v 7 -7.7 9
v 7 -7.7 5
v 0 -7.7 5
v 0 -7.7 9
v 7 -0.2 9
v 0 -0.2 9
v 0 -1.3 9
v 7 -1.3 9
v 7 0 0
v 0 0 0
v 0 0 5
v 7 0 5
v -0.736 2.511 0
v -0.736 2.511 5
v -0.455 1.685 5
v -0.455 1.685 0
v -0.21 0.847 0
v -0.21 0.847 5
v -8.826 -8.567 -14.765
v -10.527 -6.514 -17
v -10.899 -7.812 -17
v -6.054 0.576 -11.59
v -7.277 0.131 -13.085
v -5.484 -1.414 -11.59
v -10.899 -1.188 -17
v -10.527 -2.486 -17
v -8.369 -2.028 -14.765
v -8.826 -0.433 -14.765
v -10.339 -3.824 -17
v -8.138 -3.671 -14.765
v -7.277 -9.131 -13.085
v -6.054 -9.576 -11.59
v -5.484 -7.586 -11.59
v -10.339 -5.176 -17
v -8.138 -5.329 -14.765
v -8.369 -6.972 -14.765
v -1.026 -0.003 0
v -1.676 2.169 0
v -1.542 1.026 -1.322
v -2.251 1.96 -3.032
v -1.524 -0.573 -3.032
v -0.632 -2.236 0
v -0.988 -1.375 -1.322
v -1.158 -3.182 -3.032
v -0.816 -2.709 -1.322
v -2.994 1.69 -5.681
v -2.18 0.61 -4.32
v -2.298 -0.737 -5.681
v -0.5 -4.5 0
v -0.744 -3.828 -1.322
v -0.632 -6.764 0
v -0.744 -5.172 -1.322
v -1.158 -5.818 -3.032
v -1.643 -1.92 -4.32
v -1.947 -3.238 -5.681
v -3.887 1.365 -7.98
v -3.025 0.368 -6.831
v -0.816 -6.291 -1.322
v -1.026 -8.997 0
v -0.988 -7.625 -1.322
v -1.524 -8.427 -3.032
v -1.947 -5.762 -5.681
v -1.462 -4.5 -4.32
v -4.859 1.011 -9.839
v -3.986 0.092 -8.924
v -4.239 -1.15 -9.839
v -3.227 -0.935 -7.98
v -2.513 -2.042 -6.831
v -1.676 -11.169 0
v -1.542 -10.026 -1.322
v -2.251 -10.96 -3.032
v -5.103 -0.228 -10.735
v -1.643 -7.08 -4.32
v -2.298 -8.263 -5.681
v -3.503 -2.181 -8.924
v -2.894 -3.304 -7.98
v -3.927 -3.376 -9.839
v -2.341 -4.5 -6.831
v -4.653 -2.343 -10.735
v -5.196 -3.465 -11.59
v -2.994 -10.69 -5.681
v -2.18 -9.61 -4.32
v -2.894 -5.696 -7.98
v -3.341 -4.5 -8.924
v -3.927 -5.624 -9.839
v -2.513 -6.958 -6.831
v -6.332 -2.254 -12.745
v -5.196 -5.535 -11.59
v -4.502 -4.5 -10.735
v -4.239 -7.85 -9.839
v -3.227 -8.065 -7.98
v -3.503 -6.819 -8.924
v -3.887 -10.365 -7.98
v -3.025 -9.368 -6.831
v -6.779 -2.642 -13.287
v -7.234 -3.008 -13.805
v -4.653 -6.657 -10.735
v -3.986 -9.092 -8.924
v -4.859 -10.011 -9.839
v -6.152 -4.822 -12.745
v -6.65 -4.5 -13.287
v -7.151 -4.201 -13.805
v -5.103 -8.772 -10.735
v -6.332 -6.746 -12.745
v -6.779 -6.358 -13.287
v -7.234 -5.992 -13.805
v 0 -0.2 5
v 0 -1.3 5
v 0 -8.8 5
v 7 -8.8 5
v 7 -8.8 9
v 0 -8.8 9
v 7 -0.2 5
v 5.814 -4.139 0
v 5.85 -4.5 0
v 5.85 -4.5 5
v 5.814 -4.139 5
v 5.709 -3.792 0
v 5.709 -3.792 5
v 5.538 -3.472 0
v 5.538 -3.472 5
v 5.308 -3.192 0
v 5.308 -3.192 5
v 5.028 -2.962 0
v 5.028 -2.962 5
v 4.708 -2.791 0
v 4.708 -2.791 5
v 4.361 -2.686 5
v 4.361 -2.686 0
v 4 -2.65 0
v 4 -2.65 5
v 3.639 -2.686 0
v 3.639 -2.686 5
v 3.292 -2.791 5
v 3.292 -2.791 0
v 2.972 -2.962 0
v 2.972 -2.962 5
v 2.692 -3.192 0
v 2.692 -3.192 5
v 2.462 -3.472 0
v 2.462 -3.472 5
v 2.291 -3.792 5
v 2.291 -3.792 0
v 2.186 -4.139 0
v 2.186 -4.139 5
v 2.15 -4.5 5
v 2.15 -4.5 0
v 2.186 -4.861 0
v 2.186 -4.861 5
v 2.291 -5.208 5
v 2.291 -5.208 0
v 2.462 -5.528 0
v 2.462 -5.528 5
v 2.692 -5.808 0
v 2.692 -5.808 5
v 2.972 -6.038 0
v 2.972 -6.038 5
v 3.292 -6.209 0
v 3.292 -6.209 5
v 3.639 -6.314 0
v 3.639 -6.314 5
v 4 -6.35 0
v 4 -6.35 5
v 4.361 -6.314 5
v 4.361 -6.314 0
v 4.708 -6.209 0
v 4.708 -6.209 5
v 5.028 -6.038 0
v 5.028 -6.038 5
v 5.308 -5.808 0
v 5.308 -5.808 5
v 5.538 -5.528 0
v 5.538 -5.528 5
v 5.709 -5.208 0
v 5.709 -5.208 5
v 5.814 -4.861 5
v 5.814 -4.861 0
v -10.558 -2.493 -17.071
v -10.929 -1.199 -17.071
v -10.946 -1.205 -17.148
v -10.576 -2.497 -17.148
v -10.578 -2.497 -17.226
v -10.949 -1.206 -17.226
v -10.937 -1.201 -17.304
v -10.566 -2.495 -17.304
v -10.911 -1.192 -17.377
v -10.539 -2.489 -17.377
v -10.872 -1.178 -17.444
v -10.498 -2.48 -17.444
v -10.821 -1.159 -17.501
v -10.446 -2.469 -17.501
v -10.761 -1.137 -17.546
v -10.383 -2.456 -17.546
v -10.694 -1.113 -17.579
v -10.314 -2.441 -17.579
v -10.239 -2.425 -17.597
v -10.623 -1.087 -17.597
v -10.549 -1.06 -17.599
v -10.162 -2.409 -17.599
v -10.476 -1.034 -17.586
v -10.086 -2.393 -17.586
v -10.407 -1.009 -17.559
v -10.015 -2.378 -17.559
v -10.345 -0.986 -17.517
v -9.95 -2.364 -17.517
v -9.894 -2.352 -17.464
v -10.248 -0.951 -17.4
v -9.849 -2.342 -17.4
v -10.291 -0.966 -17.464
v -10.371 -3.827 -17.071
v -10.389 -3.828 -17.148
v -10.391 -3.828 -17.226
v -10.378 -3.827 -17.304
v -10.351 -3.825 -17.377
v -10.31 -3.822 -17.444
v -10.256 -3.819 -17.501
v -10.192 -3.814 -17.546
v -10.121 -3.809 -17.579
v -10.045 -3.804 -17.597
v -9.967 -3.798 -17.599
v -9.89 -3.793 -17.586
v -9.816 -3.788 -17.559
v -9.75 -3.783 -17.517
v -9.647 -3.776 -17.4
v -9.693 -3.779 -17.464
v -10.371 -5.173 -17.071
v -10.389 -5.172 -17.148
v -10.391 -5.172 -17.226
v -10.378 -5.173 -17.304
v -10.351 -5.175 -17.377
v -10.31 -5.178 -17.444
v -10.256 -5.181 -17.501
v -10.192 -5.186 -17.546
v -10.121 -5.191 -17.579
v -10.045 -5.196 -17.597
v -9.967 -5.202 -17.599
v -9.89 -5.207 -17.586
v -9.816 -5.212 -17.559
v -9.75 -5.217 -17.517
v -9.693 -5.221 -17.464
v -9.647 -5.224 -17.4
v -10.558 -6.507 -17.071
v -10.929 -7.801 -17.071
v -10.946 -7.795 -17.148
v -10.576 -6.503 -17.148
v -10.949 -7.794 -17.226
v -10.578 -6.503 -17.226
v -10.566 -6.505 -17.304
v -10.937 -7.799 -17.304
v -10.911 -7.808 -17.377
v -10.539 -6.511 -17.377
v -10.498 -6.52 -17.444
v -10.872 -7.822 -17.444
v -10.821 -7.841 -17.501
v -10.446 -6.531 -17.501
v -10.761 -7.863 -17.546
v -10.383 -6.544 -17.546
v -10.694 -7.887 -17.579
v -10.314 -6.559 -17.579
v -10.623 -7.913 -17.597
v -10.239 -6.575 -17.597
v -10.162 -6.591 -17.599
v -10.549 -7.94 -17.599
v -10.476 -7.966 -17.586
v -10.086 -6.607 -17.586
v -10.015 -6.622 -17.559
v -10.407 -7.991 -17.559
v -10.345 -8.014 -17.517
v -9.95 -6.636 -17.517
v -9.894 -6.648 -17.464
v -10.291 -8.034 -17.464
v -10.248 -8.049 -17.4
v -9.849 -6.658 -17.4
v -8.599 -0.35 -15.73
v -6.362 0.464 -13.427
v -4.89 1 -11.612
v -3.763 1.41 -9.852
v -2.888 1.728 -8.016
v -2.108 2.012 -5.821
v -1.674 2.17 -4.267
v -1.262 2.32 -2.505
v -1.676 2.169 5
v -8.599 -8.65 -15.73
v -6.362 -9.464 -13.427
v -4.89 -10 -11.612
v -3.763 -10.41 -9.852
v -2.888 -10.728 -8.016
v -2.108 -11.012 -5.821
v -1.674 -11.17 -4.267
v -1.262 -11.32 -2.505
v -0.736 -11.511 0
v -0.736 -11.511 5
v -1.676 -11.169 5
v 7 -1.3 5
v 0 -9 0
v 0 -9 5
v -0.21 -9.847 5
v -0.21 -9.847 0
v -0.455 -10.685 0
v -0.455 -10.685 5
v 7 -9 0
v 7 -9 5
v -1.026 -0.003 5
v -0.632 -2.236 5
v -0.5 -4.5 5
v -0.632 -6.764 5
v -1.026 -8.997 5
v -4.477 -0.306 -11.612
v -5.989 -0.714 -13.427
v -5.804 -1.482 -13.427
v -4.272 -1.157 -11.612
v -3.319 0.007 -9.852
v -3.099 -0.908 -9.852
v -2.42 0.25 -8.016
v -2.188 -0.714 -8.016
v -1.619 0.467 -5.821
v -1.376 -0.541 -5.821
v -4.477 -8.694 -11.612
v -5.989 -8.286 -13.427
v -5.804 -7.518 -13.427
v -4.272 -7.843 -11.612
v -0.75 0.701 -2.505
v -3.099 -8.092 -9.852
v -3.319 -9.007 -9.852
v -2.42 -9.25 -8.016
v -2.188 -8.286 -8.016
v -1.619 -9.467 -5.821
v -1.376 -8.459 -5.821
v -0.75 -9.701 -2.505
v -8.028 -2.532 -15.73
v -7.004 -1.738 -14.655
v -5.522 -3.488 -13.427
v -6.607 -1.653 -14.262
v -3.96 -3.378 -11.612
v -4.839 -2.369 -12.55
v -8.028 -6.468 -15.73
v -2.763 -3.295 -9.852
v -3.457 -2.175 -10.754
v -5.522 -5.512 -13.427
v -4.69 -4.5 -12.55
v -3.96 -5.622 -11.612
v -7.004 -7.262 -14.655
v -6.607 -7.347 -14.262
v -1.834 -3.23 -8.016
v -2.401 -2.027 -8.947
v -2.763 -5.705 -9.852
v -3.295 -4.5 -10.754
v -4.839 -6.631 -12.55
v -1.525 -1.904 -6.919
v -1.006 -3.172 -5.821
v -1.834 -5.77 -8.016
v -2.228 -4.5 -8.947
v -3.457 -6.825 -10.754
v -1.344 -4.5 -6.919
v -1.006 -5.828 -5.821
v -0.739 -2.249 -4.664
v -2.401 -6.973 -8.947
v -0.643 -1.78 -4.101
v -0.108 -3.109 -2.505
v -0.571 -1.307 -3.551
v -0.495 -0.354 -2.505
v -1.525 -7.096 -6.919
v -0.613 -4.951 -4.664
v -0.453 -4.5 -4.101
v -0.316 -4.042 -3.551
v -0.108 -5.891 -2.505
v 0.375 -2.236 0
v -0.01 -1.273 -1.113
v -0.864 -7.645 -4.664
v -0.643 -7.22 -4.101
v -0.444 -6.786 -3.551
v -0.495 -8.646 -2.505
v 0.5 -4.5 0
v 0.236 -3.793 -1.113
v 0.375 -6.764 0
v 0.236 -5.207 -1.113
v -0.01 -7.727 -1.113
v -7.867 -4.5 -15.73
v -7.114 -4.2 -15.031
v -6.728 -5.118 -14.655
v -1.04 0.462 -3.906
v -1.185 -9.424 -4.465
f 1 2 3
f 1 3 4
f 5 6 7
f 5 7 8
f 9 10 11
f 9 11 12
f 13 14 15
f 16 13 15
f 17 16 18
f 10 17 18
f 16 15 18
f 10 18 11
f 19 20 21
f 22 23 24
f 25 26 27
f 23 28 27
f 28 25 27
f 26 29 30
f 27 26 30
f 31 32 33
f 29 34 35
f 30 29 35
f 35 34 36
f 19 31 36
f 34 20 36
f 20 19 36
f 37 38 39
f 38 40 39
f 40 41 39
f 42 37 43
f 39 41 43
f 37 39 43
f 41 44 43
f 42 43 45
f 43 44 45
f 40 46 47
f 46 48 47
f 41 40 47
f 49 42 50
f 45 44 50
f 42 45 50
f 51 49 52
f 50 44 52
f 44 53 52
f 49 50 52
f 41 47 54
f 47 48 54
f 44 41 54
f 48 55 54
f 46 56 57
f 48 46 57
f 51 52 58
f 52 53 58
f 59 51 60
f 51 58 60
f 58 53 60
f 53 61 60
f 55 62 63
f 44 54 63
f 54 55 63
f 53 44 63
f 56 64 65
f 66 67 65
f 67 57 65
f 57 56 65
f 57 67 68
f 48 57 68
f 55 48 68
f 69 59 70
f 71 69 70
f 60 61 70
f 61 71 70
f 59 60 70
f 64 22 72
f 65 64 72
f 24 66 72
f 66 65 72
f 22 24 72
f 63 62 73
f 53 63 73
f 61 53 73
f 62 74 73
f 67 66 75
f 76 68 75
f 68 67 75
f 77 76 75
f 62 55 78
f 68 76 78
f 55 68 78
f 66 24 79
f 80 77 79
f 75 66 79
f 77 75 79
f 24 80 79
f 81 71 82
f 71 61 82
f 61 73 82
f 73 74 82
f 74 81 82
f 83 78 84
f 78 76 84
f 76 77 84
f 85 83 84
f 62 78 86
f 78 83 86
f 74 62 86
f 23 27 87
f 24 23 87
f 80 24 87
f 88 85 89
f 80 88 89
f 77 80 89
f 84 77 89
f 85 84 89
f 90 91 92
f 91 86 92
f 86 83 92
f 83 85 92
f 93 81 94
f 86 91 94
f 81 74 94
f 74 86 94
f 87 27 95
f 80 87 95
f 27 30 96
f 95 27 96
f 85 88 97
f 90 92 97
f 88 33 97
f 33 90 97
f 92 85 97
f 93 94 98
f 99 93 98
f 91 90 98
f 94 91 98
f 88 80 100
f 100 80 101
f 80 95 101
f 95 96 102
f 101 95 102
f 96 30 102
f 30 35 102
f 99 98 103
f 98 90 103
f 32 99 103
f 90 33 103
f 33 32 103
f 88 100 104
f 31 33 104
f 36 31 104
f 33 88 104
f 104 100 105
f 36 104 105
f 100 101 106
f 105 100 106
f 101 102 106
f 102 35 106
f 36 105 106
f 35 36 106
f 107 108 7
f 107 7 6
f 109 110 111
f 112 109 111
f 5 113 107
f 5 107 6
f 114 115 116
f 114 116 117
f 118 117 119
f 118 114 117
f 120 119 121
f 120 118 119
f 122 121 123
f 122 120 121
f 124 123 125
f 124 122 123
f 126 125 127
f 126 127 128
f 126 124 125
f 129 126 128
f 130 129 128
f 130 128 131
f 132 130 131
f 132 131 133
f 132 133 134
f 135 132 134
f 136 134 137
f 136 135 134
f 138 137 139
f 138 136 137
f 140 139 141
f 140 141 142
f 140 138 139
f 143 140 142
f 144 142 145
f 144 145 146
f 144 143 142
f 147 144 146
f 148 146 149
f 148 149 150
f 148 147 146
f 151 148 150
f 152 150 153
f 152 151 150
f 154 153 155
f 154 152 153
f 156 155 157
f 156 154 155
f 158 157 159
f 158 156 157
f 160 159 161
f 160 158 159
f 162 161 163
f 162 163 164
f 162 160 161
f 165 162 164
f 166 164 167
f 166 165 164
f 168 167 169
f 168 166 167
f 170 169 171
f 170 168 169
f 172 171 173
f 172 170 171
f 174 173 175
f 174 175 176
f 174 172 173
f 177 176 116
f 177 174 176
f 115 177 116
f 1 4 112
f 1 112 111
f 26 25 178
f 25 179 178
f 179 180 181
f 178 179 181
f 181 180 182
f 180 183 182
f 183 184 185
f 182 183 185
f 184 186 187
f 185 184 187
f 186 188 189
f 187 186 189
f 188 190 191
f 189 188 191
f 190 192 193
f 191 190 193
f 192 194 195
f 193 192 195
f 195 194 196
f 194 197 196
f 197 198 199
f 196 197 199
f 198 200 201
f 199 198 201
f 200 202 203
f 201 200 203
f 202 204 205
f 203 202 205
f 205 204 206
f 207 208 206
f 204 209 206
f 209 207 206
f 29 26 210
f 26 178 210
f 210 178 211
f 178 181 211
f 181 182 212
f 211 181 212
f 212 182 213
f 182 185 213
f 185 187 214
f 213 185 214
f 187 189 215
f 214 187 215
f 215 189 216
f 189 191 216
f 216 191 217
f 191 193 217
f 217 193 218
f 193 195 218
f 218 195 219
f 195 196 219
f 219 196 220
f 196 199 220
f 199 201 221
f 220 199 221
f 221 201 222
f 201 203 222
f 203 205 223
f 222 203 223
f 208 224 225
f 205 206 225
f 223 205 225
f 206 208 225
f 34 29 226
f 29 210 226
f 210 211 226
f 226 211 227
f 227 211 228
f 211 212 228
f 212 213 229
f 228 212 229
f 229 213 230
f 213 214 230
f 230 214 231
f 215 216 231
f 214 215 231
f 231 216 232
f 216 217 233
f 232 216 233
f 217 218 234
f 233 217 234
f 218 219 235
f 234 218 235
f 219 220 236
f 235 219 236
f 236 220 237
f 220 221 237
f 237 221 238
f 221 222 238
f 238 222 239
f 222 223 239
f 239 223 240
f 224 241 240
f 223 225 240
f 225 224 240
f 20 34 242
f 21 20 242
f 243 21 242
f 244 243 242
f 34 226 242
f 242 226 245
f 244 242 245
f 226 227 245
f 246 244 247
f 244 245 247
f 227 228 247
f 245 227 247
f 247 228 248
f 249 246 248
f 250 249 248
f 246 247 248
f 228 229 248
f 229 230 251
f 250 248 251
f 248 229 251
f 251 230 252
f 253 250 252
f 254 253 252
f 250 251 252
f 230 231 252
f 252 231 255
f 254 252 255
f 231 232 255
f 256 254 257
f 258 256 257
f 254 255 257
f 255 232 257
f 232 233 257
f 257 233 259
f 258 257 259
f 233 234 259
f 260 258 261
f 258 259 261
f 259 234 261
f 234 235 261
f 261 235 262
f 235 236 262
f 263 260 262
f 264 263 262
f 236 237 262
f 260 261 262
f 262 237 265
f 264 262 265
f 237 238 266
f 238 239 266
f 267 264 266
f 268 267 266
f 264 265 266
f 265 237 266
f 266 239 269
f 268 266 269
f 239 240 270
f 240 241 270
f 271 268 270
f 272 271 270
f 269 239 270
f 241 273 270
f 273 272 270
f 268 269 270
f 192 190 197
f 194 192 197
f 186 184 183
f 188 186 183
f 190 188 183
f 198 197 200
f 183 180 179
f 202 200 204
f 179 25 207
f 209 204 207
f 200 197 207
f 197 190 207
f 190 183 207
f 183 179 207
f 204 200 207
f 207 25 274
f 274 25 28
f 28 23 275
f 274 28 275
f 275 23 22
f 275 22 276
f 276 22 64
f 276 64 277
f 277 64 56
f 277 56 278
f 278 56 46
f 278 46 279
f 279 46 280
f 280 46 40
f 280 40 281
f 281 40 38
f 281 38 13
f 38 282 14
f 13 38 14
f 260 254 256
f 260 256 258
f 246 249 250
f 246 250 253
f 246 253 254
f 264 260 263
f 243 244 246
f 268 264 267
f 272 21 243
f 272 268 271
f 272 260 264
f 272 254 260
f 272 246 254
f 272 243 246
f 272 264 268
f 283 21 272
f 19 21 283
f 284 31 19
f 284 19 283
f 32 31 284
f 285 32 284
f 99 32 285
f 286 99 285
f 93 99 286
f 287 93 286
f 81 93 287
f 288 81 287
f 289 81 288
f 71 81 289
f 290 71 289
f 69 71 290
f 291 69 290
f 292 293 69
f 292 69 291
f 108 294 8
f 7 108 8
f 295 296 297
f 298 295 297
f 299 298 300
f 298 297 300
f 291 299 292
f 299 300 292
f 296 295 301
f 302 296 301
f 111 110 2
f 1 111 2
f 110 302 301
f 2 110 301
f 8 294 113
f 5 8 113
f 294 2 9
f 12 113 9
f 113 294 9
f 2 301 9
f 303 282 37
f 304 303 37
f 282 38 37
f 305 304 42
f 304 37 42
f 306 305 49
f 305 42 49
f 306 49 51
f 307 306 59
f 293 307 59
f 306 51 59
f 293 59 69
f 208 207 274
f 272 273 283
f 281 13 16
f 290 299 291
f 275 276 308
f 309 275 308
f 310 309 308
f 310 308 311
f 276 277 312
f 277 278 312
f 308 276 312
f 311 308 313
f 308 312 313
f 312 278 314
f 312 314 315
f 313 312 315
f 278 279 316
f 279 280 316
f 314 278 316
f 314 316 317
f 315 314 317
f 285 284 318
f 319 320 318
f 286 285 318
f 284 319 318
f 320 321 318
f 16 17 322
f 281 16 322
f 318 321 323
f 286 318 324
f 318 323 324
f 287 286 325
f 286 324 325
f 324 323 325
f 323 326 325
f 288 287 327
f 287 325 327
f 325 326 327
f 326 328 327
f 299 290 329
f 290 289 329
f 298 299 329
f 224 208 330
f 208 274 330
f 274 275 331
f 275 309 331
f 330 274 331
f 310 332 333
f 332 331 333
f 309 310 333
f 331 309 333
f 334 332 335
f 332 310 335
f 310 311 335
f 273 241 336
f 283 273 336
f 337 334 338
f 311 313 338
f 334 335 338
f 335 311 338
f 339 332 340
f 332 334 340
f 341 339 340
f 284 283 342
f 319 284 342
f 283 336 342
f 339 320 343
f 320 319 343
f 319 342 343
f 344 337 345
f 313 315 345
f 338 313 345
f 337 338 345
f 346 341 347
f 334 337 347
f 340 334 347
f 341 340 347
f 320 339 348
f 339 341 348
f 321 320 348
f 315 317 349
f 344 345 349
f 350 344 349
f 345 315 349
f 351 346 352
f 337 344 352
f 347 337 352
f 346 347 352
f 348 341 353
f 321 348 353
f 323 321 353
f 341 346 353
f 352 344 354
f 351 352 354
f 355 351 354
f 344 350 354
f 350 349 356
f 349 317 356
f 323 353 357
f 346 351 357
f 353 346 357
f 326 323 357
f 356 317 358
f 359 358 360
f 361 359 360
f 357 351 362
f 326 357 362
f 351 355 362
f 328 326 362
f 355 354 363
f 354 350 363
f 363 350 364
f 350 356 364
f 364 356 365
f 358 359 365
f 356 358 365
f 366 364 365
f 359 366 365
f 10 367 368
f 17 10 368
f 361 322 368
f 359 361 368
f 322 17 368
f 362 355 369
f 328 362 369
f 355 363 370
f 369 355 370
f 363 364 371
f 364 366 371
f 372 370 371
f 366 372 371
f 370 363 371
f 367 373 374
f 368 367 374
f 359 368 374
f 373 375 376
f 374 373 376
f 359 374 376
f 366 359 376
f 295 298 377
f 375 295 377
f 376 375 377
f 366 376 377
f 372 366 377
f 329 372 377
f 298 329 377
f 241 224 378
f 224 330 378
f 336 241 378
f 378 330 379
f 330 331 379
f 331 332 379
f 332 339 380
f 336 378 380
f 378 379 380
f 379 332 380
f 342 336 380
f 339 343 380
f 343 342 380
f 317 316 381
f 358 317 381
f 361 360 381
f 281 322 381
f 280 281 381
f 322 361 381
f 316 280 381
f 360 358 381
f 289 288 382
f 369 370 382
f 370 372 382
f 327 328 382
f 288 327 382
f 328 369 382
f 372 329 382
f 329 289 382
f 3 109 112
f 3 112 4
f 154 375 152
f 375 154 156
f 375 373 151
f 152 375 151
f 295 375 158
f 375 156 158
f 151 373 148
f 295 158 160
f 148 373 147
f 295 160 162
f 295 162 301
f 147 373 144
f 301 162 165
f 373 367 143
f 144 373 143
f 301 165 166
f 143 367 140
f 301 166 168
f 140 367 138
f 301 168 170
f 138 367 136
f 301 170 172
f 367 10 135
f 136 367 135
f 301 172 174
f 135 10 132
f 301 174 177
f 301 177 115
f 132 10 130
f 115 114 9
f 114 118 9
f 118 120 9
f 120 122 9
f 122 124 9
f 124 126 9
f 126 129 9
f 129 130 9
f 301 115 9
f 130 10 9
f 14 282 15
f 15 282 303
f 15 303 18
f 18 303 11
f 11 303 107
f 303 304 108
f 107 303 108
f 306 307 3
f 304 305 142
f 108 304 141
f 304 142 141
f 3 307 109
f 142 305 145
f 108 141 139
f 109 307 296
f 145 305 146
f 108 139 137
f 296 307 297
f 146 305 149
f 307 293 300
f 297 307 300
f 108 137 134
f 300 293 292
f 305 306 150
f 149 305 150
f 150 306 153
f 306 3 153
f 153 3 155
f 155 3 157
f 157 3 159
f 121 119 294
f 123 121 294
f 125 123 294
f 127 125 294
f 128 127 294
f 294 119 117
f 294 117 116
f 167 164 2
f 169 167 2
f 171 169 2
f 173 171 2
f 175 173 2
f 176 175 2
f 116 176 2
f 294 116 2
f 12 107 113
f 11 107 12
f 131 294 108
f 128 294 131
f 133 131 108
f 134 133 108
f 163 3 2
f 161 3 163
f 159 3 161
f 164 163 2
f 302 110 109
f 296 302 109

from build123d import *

# Parameters (mm, degrees)
F0_W          = 7
F0_H          = 9
F0_R          = 1.85
F1_DEPTH      = 5
F5_ANGLE_BACK = 20
F5_ANGLE      = 40
F6_W          = 1.6
F6_H          = 1.8669135356
F6_H_2        = 10
F7_DEPTH      = 5
F8_W          = 7
F8_H          = 1.5
F9_DEPTH      = 4
F10_W         = 0.2
F10_H         = 4
F11_DEPTH     = 25


with BuildPart() as f1:
    # F0 (on Top) → F1 (new body)
    with BuildSketch(Plane.XY):
        with Locations((3.5, -4.5)):
            Rectangle(F0_W, F0_H)
        with Locations((4, -4.5)):
            Circle(F0_R, mode=Mode.SUBTRACT)
    extrude(amount=F1_DEPTH)

    # F3 (on offset) → F5 (revolve)
    with BuildSketch(Plane.XZ.offset(4.5), mode=Mode.PRIVATE) as f5_sk:
        with BuildLine():
            Line((0.5, 5), (0, 5))
            Line((0, 5), (-0.5, 5))
            Line((-0.5, 5), (-0.5, 0))
            add(Edge.make_bspline(
                [(-0.5, 0), (-0.7940392474, -1.8718490053), (-2.3993364256, -10.2948176613), (-9.1089938236, -15.538515672), (-10.3149545762, -17)],
                knots=[0, 0, 0, 0, 0.5, 1, 1, 1, 1], degree=3))
            ThreePointArc((-10.3149545762, -17), (-10.1685444147, -17.5464101615), (-9.6221342532, -17.4))
            add(Edge.make_bspline(
                [(-9.6221342532, -17.4), (-8.3348966668, -15.9883498775), (-1.3566520207, -10.8349816991), (0.0036717937, -2.0199950425), (0.5, 0)],
                knots=[0, 0, 0, 0, 0.4942337757, 1, 1, 1, 1], degree=3))
            Line((0.5, 0), (0.5, 5))
        make_face()
    revolve(f5_sk.sketch.rotate(Axis((-20, -4.5, 1.4354154991), (0, 0, -1)), -F5_ANGLE_BACK), axis=Axis((-20, -4.5, 1.4354154991), (0, 0, -1)), revolution_arc=F5_ANGLE)

    # F6 (on face) → F7 (cut)
    with BuildSketch(Plane.XY.offset(5)):
        with Locations((0.8, -9.9334567678)):
            Rectangle(F6_W, F6_H)
        with Locations((0.8, 5)):
            Rectangle(F6_W, F6_H_2)
    extrude(amount=-F7_DEPTH, mode=Mode.SUBTRACT)

    # F8 (on face) → F9 (join)
    with BuildSketch(Plane.XY.offset(5)):
        with Locations((3.5, -0.75)):
            Rectangle(F8_W, F8_H)
        with Locations((3.5, -8.25)):
            Rectangle(F8_W, F8_H)
    extrude(amount=F9_DEPTH)

    # F10 (on face) → F11 (cut)
    with BuildSketch(Plane.YZ.offset(7)):
        with Locations((-7.6, 7)):
            Rectangle(F10_W, F10_H)
        with Locations((-8.9, 7)):
            Rectangle(F10_W, F10_H)
        with Locations((-0.1, 7)):
            Rectangle(F10_W, F10_H)
        with Locations((-1.4, 7)):
            Rectangle(F10_W, F10_H)
    extrude(amount=-F11_DEPTH, mode=Mode.SUBTRACT)


solid = f1.part
